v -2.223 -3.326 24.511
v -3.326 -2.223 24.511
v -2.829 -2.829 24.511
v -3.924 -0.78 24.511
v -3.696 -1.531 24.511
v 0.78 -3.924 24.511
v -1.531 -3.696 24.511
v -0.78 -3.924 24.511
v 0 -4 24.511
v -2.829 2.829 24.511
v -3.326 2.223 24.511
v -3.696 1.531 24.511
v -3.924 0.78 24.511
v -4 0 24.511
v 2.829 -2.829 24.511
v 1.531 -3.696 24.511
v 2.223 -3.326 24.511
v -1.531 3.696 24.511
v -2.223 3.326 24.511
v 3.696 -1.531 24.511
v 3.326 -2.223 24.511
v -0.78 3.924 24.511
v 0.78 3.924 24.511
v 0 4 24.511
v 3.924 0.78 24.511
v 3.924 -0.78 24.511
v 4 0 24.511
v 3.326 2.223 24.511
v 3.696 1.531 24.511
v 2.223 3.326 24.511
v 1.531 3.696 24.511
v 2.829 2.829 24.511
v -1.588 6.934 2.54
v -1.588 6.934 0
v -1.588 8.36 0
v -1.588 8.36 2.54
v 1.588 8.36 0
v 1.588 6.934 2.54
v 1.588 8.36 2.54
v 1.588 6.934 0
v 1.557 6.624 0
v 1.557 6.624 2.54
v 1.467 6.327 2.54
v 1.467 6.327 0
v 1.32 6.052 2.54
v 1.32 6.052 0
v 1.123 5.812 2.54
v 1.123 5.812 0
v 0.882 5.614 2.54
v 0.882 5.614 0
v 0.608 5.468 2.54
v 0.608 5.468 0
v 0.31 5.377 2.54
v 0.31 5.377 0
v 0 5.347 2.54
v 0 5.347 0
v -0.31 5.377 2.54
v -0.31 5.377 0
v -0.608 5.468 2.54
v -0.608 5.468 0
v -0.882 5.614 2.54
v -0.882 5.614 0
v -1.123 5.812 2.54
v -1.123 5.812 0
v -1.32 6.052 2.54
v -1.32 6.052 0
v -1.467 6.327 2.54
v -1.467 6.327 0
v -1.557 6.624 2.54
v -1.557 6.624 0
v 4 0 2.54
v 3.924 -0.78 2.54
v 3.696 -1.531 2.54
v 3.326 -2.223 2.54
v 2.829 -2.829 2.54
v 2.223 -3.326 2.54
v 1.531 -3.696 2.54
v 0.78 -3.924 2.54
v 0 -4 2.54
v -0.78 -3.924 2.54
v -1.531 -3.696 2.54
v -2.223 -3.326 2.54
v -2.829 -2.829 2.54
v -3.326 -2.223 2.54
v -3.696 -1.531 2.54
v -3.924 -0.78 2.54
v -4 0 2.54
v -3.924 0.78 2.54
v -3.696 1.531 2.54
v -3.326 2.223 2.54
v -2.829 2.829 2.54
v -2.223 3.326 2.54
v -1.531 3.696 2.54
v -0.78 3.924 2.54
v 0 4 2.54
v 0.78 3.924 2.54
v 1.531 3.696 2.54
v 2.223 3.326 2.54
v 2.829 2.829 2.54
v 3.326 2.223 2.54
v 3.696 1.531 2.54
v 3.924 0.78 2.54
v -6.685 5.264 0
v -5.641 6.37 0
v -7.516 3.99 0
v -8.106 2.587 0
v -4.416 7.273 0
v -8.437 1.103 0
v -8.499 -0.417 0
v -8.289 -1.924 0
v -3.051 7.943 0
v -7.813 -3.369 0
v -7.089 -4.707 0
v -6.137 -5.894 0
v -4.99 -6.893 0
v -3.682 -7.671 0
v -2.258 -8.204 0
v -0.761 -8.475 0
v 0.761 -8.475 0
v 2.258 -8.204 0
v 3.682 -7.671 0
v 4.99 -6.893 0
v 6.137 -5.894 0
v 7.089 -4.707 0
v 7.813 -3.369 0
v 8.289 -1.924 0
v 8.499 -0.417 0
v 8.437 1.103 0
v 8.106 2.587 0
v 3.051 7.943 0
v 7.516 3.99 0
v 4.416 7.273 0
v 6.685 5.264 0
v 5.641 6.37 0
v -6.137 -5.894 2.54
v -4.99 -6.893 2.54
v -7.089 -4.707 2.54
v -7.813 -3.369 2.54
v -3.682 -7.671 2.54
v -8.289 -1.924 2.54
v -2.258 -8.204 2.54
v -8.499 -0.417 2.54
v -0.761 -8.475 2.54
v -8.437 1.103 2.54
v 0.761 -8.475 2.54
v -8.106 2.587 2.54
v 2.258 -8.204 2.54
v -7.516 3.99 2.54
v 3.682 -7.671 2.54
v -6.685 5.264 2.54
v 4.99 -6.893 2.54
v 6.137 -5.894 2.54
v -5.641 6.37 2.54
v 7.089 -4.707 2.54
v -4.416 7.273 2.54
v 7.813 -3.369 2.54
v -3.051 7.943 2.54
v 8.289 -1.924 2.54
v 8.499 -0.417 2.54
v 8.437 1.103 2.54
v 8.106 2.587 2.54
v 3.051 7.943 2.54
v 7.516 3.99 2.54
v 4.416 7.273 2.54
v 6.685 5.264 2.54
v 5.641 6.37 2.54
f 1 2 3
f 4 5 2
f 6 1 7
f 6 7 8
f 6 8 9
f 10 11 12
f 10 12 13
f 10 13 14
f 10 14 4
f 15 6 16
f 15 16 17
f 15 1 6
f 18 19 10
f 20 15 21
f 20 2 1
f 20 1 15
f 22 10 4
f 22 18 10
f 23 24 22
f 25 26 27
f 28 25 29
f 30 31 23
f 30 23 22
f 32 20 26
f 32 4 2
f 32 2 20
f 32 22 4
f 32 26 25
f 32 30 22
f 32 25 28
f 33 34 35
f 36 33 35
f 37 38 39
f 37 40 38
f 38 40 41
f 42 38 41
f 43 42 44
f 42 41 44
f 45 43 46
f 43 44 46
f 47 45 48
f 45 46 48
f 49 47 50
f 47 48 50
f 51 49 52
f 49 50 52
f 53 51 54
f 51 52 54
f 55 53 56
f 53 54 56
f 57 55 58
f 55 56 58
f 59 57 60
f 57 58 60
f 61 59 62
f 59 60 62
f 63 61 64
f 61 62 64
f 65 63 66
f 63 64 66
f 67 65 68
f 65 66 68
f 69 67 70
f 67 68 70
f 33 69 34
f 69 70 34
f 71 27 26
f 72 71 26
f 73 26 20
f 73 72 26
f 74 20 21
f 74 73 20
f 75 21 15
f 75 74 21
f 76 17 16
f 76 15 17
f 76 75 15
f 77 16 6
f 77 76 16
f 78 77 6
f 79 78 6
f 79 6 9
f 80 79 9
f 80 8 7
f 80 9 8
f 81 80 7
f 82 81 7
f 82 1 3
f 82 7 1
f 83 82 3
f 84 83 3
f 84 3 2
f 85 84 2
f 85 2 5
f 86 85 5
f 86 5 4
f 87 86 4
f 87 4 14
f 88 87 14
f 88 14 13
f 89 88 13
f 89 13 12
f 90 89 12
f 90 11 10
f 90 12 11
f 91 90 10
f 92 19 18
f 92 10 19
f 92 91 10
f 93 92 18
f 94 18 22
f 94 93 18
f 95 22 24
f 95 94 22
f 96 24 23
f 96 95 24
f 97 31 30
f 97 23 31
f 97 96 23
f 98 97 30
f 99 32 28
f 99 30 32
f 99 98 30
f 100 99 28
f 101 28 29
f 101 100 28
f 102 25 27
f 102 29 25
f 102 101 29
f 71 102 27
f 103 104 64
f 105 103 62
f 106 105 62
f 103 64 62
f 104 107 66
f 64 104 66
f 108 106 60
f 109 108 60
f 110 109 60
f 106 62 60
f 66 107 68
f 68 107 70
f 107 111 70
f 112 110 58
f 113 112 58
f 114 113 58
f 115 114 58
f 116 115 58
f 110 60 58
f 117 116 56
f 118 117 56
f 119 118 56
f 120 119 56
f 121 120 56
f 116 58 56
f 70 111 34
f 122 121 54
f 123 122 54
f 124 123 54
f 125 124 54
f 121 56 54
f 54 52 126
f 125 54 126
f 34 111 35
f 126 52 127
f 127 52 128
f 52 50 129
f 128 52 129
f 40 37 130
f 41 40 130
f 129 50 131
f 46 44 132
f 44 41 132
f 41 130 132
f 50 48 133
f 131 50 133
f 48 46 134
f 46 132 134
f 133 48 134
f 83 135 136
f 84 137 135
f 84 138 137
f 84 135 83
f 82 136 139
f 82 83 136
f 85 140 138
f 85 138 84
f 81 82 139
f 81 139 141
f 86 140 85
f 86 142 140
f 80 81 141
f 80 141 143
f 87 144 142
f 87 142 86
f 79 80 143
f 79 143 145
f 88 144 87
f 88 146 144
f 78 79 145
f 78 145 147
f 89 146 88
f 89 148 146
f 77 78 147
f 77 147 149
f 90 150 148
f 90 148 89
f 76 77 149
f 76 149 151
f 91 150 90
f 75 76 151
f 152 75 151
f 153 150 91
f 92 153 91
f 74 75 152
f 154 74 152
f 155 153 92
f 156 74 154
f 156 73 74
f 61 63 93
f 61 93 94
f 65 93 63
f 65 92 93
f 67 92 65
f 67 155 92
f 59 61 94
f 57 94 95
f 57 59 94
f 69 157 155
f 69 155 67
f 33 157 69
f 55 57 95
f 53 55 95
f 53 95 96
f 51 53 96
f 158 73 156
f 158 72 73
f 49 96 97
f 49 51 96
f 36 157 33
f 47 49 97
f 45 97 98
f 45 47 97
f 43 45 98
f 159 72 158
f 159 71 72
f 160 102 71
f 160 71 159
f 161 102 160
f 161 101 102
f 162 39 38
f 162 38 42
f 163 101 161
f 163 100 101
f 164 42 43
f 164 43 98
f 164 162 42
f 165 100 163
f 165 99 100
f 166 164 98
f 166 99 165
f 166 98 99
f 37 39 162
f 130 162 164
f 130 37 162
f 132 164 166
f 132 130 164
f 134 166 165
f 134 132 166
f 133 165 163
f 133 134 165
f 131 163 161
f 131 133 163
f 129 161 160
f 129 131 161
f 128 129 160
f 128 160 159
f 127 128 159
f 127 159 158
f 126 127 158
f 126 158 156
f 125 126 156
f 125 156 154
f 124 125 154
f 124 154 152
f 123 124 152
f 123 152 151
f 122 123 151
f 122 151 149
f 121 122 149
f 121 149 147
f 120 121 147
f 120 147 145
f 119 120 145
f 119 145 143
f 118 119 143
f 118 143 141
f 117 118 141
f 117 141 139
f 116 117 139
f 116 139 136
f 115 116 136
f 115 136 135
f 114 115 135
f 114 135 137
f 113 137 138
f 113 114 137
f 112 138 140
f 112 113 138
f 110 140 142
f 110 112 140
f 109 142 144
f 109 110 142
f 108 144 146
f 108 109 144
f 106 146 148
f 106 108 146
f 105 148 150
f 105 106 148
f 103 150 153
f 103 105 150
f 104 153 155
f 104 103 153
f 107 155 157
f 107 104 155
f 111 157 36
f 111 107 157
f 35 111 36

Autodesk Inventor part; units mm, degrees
ref_plane "YZ Plane" through (0, 0, 0) normal (1, 0, 0) x (0, 1, 0)
ref_plane "XZ Plane" through (0, 0, 0) normal (0, 1, 0) x (-1, 0, 0)
ref_plane "XY Plane" through (0, 0, 0) normal (0, 0, 1) x (1, 0, 0)
sketch "Sketch1" plane through (0, 0, 0) normal (0, 0, 1) x (1, 0, 0)
  circle A0 centre (0, 0) radius 8.509
  dimension "d0" = 17.018
extrude "Extrusion1" add sketch "Sketch1" along normal blind 2.54
sketch "Sketch3" plane through (0, 0, 0) normal (0, 0, -1) x (-1, 0, 0)
  line L0 (0, 0) -> (0, 6.9342)
  circle A0 centre (0, 6.9342) radius 1.5875
  line L1 (-1.5875, 6.9342) -> (-1.5875, 8.3596)
  circle A1 centre (0, 0) radius 8.509 projected
  line L2 (1.5875, 6.9342) -> (1.5875, 8.3596)
  dimension "d6" = 6.9342
  dimension "d7" = 3.175
extrude "Extrusion3" cut sketch "Sketch3" against normal through all contours A0 A1 | A0 A1 L2 | A0 L1 A1 picked at (-0.1424, 6.414)
sketch "Sketch2" plane through (0, 0, 2.54) normal (0, 0, 1) x (1, 0, 0)
  circle A0 centre (0, 0) radius 8.509 projected
  circle A1 centre (0, 0) radius 4.0005
  dimension "d3" = 8.001
extrude "Extrusion2" add sketch "Sketch2" along normal blind 21.971 contours A1
properties part number "pulley shaft"
